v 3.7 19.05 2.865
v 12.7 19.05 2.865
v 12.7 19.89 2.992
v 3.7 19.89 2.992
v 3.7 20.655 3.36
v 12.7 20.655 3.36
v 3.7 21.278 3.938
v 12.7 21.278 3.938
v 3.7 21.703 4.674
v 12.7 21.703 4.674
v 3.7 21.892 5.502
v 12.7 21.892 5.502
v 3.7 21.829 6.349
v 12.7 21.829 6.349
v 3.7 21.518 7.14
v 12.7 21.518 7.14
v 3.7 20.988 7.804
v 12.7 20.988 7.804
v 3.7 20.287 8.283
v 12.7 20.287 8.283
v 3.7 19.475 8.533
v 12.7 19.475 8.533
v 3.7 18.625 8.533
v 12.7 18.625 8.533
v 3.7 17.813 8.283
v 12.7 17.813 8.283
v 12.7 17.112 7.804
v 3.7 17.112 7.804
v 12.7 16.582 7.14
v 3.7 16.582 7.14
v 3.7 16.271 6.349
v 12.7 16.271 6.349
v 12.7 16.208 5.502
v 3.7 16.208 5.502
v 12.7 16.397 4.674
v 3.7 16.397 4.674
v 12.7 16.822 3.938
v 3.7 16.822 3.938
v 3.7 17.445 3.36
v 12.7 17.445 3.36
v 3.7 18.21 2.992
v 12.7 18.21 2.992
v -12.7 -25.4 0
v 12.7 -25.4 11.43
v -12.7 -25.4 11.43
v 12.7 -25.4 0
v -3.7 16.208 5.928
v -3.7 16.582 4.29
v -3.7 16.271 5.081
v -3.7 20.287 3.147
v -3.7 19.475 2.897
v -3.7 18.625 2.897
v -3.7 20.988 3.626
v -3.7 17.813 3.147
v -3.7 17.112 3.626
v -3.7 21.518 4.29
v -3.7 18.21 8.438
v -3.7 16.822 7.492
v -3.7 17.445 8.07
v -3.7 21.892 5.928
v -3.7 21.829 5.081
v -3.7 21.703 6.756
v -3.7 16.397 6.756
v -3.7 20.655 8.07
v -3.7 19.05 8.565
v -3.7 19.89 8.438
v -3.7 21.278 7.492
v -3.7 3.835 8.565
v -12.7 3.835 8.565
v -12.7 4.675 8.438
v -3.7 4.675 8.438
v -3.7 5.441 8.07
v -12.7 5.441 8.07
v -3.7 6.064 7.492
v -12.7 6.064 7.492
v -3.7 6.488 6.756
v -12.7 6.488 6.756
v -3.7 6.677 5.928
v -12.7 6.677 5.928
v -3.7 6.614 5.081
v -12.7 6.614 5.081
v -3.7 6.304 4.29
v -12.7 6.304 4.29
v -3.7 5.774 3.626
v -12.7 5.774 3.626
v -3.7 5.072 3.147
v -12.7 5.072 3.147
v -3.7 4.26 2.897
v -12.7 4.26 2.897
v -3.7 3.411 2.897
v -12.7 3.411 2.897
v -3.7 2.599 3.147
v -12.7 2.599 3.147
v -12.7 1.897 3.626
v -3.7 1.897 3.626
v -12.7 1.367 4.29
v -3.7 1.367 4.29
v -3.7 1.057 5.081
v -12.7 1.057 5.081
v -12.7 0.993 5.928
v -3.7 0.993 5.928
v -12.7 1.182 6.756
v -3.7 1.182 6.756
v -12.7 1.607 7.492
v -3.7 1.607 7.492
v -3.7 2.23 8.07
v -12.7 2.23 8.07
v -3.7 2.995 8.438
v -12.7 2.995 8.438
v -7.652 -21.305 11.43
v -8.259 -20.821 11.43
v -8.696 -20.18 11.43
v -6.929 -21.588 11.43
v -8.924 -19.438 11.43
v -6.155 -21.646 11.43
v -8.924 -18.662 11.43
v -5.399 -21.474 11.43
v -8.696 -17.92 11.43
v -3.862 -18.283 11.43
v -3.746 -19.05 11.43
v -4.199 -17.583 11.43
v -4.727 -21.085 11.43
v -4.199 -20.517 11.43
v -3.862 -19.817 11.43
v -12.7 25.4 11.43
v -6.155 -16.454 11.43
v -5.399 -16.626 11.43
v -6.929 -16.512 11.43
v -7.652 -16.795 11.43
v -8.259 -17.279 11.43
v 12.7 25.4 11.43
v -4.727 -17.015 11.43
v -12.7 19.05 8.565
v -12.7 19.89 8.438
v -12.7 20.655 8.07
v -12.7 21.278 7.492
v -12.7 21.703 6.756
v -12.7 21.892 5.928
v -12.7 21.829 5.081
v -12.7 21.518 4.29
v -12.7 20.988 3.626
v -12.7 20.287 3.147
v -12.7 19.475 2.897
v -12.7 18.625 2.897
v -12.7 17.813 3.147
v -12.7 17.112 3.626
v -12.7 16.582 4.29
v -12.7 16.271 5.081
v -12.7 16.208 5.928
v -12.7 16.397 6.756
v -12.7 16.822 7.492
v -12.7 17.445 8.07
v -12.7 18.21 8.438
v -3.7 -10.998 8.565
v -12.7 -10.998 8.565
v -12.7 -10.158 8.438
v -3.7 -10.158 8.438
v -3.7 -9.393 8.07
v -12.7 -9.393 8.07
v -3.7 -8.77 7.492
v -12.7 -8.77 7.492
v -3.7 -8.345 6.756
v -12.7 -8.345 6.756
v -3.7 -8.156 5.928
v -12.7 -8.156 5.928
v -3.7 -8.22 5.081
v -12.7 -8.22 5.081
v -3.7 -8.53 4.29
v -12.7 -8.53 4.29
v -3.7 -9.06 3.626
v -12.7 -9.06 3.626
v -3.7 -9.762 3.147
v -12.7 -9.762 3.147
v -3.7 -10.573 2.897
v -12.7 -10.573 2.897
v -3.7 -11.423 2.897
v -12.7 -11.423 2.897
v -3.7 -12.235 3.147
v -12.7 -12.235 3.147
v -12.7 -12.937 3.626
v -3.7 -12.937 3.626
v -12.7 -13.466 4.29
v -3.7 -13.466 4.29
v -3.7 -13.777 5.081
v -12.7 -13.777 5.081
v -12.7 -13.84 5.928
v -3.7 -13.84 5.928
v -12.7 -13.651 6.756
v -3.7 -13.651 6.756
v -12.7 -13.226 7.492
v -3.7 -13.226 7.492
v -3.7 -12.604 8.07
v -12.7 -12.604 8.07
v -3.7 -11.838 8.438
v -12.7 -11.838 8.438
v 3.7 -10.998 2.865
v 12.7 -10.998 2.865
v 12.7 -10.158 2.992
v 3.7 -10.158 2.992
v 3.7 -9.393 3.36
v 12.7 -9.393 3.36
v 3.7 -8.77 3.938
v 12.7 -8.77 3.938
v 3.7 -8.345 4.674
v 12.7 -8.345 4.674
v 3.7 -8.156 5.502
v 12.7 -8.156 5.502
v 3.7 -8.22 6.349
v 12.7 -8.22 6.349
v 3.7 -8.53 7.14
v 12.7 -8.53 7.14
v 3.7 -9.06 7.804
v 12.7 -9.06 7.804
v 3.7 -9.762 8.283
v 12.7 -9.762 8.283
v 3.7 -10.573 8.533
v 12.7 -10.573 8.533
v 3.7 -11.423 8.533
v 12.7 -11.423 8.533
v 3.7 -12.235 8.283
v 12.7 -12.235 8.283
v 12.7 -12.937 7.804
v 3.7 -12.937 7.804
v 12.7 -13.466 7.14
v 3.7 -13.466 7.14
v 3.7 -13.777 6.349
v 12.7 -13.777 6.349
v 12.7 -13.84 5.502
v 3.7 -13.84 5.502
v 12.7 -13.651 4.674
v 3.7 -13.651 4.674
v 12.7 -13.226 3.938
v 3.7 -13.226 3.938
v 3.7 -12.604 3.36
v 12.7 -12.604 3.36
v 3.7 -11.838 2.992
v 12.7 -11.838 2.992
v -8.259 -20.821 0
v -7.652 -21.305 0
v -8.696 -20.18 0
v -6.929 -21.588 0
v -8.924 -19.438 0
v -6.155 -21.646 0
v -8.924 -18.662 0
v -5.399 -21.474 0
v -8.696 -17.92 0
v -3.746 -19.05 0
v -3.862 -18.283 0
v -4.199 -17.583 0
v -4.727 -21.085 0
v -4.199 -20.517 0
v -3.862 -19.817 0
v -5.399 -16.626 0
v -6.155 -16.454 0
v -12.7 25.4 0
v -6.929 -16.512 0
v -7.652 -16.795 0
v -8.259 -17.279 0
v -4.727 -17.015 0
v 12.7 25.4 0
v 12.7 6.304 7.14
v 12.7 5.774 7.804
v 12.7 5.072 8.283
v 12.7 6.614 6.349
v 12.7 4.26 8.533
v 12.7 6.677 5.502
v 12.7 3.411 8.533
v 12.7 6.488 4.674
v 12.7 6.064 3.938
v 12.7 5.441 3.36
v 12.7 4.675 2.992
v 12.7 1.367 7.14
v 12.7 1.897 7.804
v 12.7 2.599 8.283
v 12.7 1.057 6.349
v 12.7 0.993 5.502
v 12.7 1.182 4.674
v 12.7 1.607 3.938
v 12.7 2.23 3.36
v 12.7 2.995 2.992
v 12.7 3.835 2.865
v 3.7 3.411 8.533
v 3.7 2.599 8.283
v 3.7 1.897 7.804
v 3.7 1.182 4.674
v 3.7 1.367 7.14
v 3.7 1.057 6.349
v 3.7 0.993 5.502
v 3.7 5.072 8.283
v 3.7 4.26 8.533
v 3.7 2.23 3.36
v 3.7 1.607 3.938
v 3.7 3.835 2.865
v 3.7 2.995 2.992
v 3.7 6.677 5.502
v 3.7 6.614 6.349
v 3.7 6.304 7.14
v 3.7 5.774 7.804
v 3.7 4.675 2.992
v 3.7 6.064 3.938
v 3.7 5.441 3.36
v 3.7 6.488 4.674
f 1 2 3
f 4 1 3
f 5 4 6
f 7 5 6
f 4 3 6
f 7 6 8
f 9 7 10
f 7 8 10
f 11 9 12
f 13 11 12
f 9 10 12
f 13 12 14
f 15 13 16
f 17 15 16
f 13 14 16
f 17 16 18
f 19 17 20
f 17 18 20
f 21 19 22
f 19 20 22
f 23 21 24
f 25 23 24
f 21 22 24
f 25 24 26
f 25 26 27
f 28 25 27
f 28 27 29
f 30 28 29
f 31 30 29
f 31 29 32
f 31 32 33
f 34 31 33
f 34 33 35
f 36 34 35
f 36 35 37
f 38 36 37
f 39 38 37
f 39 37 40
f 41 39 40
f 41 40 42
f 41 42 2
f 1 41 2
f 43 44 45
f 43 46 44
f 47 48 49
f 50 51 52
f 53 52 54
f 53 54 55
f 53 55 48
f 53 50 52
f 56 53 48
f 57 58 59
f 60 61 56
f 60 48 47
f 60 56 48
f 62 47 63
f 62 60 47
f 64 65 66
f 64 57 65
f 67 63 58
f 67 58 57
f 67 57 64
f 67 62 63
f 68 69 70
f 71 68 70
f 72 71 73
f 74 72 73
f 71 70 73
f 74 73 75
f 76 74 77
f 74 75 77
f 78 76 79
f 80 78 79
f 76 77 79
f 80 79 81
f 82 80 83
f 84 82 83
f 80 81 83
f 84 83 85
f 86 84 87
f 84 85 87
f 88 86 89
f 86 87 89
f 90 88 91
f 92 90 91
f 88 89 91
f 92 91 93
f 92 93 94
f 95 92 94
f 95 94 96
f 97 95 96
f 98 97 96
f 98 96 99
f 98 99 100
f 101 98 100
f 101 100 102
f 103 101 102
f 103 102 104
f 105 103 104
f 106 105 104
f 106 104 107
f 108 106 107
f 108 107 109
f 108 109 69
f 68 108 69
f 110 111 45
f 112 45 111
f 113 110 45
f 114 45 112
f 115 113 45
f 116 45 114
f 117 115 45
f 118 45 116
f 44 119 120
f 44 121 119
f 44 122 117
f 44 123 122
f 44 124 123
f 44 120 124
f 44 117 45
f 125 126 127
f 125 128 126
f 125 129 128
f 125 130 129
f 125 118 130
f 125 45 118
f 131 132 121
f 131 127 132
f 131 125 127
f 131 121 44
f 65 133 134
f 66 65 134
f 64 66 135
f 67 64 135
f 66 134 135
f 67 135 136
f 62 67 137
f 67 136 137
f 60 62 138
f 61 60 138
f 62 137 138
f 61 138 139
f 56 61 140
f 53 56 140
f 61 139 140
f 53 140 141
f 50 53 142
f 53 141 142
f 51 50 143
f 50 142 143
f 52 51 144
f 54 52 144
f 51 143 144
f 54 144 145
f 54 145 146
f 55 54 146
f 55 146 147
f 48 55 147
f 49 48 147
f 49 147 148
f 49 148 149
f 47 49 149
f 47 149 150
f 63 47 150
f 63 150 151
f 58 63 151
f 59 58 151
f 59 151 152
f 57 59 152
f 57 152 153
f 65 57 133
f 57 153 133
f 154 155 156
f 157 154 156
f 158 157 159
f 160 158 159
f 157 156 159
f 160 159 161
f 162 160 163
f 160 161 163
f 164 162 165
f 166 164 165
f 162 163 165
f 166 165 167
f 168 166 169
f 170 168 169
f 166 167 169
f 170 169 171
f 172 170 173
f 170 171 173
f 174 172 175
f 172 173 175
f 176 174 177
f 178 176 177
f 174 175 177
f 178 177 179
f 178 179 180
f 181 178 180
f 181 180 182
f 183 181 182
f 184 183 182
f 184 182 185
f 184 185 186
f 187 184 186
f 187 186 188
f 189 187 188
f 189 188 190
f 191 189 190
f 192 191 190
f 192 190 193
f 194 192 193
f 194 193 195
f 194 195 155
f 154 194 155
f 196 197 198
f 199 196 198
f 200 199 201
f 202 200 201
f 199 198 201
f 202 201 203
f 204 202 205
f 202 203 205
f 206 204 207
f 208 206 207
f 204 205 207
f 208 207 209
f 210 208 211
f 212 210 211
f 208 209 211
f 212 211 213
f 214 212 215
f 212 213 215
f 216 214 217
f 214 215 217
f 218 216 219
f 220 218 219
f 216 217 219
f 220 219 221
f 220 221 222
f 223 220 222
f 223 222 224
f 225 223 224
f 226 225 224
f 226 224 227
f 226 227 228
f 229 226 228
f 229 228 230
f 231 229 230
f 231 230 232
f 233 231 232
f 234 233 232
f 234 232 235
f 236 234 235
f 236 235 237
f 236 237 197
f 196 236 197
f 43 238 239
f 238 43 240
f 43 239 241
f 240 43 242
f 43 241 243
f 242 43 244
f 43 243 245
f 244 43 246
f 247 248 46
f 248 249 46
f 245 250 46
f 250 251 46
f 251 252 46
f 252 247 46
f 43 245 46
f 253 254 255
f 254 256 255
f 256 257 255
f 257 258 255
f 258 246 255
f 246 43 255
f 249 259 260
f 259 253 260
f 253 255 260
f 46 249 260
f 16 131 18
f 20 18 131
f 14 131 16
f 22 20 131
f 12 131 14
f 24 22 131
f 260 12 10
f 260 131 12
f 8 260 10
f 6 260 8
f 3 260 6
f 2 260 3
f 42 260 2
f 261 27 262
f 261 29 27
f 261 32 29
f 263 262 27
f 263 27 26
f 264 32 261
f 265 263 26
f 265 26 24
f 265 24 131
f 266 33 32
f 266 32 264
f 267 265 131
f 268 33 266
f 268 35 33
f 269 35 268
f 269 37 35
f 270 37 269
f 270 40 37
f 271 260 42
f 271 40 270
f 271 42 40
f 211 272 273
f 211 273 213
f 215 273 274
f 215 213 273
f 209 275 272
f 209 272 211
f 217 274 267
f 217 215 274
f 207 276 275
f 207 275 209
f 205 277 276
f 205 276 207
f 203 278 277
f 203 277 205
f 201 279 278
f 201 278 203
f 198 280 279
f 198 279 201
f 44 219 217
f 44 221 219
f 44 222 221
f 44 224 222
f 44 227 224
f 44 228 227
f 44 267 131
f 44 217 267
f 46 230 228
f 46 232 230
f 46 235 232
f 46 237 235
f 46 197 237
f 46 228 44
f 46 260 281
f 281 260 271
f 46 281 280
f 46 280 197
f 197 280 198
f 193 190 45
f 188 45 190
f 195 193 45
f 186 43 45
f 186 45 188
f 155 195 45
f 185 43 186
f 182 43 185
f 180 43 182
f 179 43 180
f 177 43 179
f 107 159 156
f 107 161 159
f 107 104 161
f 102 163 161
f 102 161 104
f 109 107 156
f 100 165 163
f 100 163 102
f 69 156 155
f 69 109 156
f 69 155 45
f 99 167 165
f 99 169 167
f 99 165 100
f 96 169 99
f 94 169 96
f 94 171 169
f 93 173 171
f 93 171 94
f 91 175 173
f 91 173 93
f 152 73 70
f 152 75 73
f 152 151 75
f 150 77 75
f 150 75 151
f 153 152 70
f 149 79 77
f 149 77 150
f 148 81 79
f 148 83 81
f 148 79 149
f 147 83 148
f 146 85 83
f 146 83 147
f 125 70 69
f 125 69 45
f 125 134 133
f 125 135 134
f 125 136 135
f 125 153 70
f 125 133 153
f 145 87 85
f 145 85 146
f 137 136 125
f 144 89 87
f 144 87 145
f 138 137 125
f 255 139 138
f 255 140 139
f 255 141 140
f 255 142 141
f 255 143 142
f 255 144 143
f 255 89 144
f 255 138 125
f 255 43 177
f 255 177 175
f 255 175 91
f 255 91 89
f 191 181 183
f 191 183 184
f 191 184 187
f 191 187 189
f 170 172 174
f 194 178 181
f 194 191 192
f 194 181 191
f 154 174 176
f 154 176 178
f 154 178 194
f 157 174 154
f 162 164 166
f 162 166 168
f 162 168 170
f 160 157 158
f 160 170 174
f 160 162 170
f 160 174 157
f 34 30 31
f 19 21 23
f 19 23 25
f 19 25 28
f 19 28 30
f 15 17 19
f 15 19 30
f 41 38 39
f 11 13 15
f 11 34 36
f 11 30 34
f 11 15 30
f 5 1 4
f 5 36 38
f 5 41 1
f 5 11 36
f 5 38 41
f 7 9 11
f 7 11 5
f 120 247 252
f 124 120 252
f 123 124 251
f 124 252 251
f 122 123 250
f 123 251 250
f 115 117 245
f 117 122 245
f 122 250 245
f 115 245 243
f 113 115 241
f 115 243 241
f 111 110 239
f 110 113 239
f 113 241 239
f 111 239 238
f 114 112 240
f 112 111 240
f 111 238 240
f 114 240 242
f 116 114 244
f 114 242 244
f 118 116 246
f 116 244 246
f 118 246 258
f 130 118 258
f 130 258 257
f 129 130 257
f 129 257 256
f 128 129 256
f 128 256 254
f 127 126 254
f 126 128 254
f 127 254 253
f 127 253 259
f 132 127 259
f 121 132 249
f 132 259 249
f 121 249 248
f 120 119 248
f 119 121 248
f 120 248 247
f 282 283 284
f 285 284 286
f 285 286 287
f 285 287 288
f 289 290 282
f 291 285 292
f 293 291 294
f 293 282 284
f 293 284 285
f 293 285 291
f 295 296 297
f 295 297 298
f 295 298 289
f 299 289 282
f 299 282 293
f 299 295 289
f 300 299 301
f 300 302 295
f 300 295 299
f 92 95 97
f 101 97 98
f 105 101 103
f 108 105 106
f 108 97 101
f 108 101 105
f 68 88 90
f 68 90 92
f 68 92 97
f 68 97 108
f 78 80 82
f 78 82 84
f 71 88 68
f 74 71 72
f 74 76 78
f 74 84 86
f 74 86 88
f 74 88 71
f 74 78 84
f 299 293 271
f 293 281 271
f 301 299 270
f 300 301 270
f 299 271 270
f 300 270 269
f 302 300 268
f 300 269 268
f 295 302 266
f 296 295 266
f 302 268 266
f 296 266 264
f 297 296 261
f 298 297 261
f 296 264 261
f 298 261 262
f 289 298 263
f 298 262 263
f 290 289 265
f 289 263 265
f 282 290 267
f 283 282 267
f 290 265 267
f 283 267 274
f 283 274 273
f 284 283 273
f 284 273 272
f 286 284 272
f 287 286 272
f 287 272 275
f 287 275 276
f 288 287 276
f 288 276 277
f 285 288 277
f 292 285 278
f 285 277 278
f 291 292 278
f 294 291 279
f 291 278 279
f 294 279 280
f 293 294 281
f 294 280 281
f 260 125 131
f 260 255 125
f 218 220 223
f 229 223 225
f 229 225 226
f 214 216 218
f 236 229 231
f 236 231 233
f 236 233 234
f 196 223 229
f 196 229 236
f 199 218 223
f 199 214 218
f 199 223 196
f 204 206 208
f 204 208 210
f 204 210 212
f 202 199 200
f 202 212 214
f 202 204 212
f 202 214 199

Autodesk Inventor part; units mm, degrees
ref_plane "YZ Plane" through (0, 0, 0) normal (1, 0, 0) x (0, 1, 0)
ref_plane "XZ Plane" through (0, 0, 0) normal (0, 1, 0) x (-1, 0, 0)
ref_plane "XY Plane" through (0, 0, 0) normal (0, 0, 1) x (1, 0, 0)
sketch "Sketch1" plane through (0, 0, 0) normal (0, 0, 1) x (1, 0, 0)
  line L0 (12.7, -25.4) -> (-12.7, -25.4)
  line L1 (-12.7, -25.4) -> (-12.7, 25.4)
  line L2 (-12.7, 25.4) -> (12.7, 25.4)
  line L3 (12.7, 25.4) -> (12.7, -25.4)
  line L4 (12.7, -25.4) -> (-12.7, 25.4) construction
  line L5 (-12.7, -25.4) -> (12.7, 25.4) construction
  line L6 (-12.7, 25.4) -> (0, 25.4)
  circle A0 centre (-6.35, -19.05) radius 2.6035
  line L7 (-12.7, 25.4) -> (-3.7, 25.4) construction
  line L8 (-3.7, 25.4) -> (-3.7, -25.4) construction
  line L9 (-3.7, -25.4) -> (-12.7, -25.4) construction
  line L10 (-12.7, -25.4) -> (-12.7, 25.4) construction
  point P0 (0, 0)
  dimension "d0" = 25.4
  dimension "d1" = 50.8
  dimension "d4" = 5.207
  dimension "d5" = 6.35
  dimension "d7" = 9
  dimension "d8" = 6.35
extrude "Extrusion1" add sketch "Sketch1" along normal blind 11.43
sketch "Sketch2" plane through (-12.7, -25.4, 0) normal (-1, 0, 0) x (0, 0, 1)
  line L0 (0, 50.8) -> (0, 0) projected
  line L1 (0, 0) -> (11.43, 0) projected
  line L2 (11.43, 50.8) -> (11.43, 0) projected
  line L3 (0, 50.8) -> (11.43, 50.8) projected
  line L4 (0, 50.8) -> (11.43, 50.8) construction
  line L5 (5.715, 50.8) -> (5.715, 0) construction
  line L6 (0, 0) -> (11.43, 0) construction
  line L7 (0, 25.4) -> (11.43, 25.4) construction
  line L8 (11.43, 0) -> (11.43, 50.8) construction
  circle A0 centre (5.715, 44.45) radius 2.85
  circle A1 centre (5.715, 29.2354) radius 2.85
  circle A2 centre (5.715, 14.4018) radius 2.85
  dimension "d11" = 5.7
  dimension "d12" = 6.35
  dimension "d13" = 5.7
  dimension "d14" = 15.2146
  dimension "d15" = 5.7
  dimension "d16" = 14.8336
extrude "Extrusion2" cut sketch "Sketch2" against normal blind 9 contours A0 | A1 | A2
sketch "Sketch3" plane through (12.7, -25.4, 0) normal (1, 0, 0) x (0, 0, -1)
  line L0 (0, 0) -> (0, 50.8) projected
  line L1 (0, 50.8) -> (-11.43, 50.8) projected
  line L2 (-11.43, 0) -> (-11.43, 50.8) projected
  line L3 (0, 0) -> (-11.43, 0) projected
  circle A0 centre (-5.715, 44.45) radius 2.85 projected
  circle A1 centre (-5.715, 29.2354) radius 2.85 projected
  circle A2 centre (-5.715, 14.4018) radius 2.85 projected
  point P0 (0, 25.4)
extrude "Extrusion3" cut sketch "Sketch3" against normal blind 9 contours A0 | A1 | A2
properties part number "Torsion_Spring_Lift"
